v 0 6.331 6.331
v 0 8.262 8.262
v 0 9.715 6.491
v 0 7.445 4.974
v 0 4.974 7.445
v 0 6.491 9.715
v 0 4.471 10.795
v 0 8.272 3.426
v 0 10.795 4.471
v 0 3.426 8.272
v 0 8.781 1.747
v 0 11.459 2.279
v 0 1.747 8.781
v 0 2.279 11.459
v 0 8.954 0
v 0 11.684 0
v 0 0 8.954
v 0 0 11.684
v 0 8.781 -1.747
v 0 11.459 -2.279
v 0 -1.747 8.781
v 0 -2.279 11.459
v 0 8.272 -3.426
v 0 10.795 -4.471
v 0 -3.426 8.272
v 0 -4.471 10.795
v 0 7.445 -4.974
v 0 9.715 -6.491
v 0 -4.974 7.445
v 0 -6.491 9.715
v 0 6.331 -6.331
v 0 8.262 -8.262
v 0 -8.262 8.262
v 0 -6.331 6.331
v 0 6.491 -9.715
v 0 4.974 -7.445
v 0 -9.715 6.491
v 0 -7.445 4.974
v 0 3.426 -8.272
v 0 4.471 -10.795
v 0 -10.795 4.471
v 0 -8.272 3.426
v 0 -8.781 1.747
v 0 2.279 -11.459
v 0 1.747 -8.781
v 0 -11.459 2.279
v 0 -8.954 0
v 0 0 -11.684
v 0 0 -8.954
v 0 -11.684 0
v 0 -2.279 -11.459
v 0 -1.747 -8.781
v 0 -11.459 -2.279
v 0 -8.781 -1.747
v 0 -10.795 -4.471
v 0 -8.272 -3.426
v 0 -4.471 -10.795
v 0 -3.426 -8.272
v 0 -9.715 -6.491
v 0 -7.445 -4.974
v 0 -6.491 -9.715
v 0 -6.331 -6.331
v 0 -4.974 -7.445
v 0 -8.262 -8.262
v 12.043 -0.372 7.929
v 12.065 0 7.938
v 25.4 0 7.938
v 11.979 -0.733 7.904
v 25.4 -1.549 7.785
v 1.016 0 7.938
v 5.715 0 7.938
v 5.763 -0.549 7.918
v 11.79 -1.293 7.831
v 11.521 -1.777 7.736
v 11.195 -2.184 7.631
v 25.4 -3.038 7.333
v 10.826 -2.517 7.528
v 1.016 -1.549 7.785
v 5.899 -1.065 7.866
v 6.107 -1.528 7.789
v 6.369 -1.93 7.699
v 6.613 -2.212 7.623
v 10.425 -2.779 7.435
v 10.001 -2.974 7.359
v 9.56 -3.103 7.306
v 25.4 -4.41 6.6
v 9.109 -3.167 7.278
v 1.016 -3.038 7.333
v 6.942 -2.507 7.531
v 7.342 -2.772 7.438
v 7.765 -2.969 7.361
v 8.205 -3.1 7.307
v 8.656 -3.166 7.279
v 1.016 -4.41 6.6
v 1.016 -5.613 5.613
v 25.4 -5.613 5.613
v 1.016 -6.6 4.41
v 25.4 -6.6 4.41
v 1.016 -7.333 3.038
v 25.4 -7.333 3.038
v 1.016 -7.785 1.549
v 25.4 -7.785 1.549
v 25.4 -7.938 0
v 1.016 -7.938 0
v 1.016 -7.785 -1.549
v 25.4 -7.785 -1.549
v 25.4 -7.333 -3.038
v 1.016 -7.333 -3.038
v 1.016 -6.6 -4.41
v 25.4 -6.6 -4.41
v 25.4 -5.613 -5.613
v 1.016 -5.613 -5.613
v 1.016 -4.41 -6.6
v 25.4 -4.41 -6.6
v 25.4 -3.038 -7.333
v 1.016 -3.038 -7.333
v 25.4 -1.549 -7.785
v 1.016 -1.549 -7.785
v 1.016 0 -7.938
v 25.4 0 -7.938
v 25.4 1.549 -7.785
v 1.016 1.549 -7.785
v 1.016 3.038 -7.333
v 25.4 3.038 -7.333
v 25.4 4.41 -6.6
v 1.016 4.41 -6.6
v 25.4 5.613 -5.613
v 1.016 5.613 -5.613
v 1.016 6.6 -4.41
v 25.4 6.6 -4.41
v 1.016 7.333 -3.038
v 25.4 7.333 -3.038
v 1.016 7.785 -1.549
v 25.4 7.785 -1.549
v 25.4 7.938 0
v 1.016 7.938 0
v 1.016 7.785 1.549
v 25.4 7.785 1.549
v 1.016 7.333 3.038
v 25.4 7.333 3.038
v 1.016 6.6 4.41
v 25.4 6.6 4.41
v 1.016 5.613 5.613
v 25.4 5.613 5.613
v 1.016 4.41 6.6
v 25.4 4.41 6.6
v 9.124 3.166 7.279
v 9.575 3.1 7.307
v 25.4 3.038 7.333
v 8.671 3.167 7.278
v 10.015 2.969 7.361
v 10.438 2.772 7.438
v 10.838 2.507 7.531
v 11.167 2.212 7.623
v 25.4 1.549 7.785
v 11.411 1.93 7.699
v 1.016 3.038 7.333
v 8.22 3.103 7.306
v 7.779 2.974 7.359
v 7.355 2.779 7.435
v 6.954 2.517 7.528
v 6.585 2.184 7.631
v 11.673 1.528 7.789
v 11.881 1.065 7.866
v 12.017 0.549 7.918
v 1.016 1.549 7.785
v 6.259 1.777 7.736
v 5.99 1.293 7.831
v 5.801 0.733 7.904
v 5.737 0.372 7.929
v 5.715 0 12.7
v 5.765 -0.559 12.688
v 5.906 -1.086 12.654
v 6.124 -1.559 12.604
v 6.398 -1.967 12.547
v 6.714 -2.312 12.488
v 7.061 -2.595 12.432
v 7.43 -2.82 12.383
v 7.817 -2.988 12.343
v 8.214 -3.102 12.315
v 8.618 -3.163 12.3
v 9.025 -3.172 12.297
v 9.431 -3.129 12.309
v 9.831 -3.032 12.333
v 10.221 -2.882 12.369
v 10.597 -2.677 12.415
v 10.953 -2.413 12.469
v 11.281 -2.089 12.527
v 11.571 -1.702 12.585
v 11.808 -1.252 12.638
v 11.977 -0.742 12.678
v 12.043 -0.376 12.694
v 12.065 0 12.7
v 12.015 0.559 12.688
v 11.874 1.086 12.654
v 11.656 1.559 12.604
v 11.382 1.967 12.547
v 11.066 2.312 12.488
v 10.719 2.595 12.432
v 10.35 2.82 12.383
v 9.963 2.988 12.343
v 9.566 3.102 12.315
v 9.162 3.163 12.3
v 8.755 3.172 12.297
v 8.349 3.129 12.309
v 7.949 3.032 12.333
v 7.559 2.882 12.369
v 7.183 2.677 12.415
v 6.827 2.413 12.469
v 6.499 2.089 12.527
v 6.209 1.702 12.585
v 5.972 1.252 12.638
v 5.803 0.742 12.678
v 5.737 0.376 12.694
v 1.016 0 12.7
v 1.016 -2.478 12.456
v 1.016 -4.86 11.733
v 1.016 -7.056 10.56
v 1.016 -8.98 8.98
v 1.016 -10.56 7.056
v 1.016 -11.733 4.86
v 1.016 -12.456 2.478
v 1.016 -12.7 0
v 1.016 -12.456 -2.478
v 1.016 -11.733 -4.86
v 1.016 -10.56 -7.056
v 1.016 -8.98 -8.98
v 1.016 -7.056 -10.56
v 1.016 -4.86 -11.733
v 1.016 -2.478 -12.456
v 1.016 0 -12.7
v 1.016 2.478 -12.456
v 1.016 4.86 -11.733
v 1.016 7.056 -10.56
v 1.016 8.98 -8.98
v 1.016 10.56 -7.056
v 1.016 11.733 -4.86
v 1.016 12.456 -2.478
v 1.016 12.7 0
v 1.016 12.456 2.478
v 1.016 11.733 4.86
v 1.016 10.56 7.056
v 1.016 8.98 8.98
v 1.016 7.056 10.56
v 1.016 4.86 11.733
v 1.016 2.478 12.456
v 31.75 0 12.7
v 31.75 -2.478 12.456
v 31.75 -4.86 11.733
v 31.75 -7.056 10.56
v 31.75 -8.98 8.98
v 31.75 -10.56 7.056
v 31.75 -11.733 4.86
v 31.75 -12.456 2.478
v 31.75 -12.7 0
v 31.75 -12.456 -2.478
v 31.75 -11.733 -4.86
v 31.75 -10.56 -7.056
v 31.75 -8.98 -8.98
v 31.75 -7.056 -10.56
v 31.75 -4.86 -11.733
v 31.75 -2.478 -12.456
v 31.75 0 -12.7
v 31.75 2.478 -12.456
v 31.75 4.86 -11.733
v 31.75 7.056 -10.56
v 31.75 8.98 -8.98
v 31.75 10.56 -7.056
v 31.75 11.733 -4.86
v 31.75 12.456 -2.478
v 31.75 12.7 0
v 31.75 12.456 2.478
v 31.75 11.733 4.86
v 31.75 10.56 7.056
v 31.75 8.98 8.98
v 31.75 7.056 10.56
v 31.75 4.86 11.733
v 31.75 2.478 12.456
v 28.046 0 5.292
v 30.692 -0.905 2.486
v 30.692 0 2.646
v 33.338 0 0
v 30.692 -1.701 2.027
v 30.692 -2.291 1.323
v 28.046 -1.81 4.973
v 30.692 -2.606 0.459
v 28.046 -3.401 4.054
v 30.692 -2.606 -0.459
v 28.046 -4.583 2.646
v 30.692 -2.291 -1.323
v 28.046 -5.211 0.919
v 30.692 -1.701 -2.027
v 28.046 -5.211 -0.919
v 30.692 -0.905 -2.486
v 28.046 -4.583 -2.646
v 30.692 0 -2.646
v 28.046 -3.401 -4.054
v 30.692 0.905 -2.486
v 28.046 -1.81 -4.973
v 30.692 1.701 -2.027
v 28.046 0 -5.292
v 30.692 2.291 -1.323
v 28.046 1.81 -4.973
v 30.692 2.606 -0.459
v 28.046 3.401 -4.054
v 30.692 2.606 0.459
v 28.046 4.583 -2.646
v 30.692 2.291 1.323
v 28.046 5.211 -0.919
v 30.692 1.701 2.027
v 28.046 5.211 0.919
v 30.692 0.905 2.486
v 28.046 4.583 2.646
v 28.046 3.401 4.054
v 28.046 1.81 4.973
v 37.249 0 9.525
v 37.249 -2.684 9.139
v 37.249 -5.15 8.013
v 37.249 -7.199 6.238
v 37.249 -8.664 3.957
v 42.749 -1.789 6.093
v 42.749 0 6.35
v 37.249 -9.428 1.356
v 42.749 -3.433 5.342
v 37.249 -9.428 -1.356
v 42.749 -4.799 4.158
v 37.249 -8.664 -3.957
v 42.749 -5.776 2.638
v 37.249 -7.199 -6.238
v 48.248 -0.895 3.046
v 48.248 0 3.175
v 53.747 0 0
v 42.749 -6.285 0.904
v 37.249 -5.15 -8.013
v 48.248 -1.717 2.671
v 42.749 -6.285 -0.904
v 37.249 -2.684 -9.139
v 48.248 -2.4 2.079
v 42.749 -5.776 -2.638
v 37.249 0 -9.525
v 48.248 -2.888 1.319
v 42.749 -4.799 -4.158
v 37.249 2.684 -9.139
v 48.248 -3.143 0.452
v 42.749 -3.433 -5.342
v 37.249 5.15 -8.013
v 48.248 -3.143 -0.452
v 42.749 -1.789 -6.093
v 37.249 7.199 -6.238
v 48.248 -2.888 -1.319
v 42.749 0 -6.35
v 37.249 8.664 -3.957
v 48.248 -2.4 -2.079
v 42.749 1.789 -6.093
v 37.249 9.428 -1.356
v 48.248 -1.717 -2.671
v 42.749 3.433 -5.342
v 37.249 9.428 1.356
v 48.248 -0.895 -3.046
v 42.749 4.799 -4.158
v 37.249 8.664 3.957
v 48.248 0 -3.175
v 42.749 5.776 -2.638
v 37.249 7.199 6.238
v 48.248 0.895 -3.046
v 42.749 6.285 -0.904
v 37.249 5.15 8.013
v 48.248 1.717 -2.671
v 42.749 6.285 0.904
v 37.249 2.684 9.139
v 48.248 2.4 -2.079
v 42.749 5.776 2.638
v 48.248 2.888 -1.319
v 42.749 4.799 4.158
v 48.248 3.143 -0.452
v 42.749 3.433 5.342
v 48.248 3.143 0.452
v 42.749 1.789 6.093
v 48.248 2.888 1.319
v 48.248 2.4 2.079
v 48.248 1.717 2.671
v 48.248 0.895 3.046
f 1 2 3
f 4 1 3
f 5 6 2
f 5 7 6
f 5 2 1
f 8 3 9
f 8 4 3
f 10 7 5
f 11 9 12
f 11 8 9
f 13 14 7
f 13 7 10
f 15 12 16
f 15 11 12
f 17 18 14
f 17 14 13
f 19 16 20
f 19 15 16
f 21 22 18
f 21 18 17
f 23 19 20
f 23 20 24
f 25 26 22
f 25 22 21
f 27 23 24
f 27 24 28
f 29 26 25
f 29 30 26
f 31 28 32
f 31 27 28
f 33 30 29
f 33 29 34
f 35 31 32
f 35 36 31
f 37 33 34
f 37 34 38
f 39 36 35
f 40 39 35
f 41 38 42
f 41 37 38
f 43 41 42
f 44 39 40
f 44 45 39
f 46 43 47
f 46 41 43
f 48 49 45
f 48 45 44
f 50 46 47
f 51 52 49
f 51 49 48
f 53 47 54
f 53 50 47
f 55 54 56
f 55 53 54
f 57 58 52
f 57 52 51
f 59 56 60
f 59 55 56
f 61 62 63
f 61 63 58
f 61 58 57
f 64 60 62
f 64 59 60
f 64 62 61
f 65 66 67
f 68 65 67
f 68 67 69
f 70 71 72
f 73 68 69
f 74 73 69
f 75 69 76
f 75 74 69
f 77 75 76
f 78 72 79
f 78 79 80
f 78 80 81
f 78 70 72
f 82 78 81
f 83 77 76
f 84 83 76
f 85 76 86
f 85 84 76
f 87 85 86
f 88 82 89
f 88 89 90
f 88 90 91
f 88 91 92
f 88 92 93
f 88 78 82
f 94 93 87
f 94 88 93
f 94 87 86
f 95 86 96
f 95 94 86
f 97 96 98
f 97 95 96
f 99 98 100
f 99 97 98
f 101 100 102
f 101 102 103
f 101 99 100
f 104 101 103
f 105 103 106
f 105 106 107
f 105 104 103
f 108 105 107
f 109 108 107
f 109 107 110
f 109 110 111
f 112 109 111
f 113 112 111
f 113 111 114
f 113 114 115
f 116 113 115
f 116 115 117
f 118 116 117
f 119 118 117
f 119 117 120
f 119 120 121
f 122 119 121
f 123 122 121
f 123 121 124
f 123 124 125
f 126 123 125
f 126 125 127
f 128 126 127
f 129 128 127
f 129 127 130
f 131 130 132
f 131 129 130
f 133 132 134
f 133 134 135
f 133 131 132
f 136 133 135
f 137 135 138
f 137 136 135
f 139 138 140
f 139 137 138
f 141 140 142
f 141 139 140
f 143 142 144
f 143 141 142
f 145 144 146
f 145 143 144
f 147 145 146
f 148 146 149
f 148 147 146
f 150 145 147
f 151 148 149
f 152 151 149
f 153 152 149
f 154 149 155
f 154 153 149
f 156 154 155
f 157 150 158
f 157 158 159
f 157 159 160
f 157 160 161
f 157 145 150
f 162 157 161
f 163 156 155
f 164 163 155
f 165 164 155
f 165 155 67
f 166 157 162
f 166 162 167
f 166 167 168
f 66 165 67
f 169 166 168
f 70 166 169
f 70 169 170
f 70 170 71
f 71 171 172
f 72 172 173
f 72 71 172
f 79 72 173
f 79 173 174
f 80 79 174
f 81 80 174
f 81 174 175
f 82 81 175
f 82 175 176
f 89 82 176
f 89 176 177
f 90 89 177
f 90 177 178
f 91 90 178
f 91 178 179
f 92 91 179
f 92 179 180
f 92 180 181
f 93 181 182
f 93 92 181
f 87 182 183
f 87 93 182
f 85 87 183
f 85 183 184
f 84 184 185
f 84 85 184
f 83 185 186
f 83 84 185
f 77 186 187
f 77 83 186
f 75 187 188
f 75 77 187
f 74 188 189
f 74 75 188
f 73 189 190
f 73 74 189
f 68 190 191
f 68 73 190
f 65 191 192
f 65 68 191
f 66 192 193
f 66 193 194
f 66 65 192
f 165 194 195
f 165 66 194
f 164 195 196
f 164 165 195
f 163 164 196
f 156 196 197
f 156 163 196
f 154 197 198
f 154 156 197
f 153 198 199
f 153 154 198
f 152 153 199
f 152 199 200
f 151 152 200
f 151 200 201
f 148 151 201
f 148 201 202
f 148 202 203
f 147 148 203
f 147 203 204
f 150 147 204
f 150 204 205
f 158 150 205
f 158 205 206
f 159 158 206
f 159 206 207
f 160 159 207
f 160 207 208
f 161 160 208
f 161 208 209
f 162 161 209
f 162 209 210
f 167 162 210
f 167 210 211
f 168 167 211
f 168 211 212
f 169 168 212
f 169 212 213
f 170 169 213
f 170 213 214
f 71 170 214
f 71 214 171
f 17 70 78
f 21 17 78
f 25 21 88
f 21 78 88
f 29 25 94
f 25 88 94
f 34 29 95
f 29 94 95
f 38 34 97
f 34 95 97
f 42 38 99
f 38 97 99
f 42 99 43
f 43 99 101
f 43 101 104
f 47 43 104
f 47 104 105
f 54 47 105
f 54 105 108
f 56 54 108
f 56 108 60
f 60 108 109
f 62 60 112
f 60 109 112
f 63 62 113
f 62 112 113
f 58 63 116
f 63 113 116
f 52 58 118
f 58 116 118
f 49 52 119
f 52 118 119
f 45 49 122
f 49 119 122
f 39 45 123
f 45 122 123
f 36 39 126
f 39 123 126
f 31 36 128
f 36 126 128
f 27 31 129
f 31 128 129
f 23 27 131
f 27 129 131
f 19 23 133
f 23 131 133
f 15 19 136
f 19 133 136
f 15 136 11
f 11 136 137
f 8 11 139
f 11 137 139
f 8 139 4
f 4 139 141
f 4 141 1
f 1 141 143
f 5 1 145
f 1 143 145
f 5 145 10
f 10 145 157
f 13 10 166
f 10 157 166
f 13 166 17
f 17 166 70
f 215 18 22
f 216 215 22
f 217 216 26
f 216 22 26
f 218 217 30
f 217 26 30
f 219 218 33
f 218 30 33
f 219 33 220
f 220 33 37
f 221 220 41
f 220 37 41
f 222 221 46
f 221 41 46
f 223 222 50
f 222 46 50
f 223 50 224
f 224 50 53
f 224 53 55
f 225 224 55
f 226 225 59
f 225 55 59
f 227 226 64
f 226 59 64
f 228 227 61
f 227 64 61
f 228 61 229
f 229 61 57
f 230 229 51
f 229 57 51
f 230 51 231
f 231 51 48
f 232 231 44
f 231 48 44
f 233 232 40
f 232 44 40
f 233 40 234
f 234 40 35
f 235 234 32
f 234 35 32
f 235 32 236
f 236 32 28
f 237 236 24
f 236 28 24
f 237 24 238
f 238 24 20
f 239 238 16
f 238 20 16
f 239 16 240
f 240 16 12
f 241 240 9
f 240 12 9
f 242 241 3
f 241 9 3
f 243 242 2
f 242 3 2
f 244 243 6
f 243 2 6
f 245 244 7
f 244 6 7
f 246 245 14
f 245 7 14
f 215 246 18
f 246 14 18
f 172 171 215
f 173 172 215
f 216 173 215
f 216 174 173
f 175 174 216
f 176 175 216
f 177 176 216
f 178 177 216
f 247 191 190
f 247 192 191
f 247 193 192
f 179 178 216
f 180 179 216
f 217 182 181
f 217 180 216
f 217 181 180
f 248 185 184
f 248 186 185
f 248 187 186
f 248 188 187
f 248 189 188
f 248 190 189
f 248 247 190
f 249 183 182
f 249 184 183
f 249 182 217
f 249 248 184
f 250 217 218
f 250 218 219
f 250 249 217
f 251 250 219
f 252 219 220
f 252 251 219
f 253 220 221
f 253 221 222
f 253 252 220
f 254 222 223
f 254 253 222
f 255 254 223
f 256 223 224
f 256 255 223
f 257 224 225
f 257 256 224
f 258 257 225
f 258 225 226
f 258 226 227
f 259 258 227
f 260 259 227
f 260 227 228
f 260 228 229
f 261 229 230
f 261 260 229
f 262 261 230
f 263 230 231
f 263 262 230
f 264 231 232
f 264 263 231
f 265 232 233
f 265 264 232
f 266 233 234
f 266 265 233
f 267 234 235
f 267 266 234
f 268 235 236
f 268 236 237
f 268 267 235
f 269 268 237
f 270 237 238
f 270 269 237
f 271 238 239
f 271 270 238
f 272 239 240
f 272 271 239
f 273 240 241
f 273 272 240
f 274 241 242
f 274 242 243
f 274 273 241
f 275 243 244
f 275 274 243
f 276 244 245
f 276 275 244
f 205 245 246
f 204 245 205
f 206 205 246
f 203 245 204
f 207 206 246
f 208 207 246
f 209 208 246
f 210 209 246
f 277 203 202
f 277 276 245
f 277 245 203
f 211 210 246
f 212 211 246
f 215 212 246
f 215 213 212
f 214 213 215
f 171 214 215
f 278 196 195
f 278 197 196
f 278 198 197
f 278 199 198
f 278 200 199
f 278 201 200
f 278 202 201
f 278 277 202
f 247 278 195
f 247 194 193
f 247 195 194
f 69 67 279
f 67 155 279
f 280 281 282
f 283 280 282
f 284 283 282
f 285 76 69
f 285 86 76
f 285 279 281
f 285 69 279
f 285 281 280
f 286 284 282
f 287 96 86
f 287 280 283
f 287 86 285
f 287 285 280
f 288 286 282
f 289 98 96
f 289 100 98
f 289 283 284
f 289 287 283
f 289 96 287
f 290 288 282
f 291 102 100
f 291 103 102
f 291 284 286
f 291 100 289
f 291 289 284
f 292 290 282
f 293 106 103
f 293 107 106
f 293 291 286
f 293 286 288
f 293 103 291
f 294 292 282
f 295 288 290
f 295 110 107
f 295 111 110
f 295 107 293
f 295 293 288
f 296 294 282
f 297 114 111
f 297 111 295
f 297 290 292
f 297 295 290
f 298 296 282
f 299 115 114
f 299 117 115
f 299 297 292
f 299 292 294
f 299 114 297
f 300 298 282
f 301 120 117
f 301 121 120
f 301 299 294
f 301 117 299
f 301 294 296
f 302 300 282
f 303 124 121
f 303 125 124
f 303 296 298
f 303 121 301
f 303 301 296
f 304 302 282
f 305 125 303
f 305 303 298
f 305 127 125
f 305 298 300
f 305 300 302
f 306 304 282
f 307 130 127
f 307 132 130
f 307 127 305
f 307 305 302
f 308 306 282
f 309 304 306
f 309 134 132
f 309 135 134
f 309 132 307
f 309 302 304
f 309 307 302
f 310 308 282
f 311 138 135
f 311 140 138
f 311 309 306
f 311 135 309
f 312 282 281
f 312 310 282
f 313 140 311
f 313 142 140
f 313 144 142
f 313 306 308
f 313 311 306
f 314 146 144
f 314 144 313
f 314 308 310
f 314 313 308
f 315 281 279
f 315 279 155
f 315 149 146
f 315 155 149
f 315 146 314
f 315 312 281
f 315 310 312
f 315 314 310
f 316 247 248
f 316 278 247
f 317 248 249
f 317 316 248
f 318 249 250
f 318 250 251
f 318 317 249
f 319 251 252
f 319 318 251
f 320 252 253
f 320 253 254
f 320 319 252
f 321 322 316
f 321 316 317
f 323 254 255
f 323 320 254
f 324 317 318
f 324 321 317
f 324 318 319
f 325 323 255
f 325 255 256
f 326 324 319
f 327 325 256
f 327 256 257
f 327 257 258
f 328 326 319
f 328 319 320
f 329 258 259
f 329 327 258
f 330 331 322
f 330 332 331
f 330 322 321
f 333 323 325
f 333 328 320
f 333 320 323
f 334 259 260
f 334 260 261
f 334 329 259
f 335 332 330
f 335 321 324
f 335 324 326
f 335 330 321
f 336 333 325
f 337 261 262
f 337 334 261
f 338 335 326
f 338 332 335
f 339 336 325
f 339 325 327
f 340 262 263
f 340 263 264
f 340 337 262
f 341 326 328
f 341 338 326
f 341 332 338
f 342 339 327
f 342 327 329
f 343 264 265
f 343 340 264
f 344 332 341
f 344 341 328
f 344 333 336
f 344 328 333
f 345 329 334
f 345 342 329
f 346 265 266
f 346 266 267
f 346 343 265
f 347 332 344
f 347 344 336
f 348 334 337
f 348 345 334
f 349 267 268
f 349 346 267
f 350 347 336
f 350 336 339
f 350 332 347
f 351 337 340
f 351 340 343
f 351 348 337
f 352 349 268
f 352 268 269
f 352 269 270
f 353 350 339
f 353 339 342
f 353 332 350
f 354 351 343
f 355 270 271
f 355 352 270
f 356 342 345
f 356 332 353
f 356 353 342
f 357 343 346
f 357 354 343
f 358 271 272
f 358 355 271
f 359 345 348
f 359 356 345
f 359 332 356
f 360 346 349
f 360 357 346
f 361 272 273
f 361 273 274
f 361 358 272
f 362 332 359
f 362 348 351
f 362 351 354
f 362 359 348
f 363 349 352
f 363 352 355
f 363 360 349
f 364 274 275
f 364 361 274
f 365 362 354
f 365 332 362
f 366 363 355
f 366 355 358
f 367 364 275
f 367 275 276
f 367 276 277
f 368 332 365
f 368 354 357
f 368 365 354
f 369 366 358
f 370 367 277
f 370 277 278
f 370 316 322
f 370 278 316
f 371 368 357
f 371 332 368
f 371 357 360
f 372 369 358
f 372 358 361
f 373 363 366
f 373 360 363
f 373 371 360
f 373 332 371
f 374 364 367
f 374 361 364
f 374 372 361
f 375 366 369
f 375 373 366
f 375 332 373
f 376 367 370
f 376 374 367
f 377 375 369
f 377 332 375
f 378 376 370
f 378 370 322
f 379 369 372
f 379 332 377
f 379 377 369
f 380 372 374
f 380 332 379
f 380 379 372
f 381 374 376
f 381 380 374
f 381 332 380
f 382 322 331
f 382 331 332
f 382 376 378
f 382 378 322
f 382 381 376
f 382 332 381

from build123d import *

# Parameters (mm, degrees)
SKETCH2_R          = 3.175
CUT_EXTRUDE1_DEPTH = 57.668552776
CHAMFER1_SIZE      = 1.016


with BuildPart() as part:
    # Sketch1 → Revolve1 (revolve)
    with BuildSketch(Plane.XY, mode=Mode.PRIVATE) as revolve1_sk:
        Polygon((0, 12.7), (31.75, 12.7), (53.747045256, 0), (33.3375, 0), (25.4, 7.9375), (0, 7.9375), align=None)
    revolve(revolve1_sk.sketch.rotate(Axis((0, 0, 0), (1, 0, 0)), 90), axis=Axis((0, 0, 0), (1, 0, 0)))

    # Sketch2 → Cut-Extrude1 (cut, through all)
    with BuildSketch(Plane.XY):
        with Locations(Location((8.89, 0, 0), (0, 0, 180))):
            Circle(SKETCH2_R)
    extrude(amount=CUT_EXTRUDE1_DEPTH, mode=Mode.SUBTRACT)

    # Chamfer1
    chamfer1_edges = [part.edges().sort_by_distance(p)[0] for p in [
        (0, 0, -12.7),
        (0, 0, -7.9375),
    ]]
    chamfer(chamfer1_edges, length=CHAMFER1_SIZE)


solid = part.part
